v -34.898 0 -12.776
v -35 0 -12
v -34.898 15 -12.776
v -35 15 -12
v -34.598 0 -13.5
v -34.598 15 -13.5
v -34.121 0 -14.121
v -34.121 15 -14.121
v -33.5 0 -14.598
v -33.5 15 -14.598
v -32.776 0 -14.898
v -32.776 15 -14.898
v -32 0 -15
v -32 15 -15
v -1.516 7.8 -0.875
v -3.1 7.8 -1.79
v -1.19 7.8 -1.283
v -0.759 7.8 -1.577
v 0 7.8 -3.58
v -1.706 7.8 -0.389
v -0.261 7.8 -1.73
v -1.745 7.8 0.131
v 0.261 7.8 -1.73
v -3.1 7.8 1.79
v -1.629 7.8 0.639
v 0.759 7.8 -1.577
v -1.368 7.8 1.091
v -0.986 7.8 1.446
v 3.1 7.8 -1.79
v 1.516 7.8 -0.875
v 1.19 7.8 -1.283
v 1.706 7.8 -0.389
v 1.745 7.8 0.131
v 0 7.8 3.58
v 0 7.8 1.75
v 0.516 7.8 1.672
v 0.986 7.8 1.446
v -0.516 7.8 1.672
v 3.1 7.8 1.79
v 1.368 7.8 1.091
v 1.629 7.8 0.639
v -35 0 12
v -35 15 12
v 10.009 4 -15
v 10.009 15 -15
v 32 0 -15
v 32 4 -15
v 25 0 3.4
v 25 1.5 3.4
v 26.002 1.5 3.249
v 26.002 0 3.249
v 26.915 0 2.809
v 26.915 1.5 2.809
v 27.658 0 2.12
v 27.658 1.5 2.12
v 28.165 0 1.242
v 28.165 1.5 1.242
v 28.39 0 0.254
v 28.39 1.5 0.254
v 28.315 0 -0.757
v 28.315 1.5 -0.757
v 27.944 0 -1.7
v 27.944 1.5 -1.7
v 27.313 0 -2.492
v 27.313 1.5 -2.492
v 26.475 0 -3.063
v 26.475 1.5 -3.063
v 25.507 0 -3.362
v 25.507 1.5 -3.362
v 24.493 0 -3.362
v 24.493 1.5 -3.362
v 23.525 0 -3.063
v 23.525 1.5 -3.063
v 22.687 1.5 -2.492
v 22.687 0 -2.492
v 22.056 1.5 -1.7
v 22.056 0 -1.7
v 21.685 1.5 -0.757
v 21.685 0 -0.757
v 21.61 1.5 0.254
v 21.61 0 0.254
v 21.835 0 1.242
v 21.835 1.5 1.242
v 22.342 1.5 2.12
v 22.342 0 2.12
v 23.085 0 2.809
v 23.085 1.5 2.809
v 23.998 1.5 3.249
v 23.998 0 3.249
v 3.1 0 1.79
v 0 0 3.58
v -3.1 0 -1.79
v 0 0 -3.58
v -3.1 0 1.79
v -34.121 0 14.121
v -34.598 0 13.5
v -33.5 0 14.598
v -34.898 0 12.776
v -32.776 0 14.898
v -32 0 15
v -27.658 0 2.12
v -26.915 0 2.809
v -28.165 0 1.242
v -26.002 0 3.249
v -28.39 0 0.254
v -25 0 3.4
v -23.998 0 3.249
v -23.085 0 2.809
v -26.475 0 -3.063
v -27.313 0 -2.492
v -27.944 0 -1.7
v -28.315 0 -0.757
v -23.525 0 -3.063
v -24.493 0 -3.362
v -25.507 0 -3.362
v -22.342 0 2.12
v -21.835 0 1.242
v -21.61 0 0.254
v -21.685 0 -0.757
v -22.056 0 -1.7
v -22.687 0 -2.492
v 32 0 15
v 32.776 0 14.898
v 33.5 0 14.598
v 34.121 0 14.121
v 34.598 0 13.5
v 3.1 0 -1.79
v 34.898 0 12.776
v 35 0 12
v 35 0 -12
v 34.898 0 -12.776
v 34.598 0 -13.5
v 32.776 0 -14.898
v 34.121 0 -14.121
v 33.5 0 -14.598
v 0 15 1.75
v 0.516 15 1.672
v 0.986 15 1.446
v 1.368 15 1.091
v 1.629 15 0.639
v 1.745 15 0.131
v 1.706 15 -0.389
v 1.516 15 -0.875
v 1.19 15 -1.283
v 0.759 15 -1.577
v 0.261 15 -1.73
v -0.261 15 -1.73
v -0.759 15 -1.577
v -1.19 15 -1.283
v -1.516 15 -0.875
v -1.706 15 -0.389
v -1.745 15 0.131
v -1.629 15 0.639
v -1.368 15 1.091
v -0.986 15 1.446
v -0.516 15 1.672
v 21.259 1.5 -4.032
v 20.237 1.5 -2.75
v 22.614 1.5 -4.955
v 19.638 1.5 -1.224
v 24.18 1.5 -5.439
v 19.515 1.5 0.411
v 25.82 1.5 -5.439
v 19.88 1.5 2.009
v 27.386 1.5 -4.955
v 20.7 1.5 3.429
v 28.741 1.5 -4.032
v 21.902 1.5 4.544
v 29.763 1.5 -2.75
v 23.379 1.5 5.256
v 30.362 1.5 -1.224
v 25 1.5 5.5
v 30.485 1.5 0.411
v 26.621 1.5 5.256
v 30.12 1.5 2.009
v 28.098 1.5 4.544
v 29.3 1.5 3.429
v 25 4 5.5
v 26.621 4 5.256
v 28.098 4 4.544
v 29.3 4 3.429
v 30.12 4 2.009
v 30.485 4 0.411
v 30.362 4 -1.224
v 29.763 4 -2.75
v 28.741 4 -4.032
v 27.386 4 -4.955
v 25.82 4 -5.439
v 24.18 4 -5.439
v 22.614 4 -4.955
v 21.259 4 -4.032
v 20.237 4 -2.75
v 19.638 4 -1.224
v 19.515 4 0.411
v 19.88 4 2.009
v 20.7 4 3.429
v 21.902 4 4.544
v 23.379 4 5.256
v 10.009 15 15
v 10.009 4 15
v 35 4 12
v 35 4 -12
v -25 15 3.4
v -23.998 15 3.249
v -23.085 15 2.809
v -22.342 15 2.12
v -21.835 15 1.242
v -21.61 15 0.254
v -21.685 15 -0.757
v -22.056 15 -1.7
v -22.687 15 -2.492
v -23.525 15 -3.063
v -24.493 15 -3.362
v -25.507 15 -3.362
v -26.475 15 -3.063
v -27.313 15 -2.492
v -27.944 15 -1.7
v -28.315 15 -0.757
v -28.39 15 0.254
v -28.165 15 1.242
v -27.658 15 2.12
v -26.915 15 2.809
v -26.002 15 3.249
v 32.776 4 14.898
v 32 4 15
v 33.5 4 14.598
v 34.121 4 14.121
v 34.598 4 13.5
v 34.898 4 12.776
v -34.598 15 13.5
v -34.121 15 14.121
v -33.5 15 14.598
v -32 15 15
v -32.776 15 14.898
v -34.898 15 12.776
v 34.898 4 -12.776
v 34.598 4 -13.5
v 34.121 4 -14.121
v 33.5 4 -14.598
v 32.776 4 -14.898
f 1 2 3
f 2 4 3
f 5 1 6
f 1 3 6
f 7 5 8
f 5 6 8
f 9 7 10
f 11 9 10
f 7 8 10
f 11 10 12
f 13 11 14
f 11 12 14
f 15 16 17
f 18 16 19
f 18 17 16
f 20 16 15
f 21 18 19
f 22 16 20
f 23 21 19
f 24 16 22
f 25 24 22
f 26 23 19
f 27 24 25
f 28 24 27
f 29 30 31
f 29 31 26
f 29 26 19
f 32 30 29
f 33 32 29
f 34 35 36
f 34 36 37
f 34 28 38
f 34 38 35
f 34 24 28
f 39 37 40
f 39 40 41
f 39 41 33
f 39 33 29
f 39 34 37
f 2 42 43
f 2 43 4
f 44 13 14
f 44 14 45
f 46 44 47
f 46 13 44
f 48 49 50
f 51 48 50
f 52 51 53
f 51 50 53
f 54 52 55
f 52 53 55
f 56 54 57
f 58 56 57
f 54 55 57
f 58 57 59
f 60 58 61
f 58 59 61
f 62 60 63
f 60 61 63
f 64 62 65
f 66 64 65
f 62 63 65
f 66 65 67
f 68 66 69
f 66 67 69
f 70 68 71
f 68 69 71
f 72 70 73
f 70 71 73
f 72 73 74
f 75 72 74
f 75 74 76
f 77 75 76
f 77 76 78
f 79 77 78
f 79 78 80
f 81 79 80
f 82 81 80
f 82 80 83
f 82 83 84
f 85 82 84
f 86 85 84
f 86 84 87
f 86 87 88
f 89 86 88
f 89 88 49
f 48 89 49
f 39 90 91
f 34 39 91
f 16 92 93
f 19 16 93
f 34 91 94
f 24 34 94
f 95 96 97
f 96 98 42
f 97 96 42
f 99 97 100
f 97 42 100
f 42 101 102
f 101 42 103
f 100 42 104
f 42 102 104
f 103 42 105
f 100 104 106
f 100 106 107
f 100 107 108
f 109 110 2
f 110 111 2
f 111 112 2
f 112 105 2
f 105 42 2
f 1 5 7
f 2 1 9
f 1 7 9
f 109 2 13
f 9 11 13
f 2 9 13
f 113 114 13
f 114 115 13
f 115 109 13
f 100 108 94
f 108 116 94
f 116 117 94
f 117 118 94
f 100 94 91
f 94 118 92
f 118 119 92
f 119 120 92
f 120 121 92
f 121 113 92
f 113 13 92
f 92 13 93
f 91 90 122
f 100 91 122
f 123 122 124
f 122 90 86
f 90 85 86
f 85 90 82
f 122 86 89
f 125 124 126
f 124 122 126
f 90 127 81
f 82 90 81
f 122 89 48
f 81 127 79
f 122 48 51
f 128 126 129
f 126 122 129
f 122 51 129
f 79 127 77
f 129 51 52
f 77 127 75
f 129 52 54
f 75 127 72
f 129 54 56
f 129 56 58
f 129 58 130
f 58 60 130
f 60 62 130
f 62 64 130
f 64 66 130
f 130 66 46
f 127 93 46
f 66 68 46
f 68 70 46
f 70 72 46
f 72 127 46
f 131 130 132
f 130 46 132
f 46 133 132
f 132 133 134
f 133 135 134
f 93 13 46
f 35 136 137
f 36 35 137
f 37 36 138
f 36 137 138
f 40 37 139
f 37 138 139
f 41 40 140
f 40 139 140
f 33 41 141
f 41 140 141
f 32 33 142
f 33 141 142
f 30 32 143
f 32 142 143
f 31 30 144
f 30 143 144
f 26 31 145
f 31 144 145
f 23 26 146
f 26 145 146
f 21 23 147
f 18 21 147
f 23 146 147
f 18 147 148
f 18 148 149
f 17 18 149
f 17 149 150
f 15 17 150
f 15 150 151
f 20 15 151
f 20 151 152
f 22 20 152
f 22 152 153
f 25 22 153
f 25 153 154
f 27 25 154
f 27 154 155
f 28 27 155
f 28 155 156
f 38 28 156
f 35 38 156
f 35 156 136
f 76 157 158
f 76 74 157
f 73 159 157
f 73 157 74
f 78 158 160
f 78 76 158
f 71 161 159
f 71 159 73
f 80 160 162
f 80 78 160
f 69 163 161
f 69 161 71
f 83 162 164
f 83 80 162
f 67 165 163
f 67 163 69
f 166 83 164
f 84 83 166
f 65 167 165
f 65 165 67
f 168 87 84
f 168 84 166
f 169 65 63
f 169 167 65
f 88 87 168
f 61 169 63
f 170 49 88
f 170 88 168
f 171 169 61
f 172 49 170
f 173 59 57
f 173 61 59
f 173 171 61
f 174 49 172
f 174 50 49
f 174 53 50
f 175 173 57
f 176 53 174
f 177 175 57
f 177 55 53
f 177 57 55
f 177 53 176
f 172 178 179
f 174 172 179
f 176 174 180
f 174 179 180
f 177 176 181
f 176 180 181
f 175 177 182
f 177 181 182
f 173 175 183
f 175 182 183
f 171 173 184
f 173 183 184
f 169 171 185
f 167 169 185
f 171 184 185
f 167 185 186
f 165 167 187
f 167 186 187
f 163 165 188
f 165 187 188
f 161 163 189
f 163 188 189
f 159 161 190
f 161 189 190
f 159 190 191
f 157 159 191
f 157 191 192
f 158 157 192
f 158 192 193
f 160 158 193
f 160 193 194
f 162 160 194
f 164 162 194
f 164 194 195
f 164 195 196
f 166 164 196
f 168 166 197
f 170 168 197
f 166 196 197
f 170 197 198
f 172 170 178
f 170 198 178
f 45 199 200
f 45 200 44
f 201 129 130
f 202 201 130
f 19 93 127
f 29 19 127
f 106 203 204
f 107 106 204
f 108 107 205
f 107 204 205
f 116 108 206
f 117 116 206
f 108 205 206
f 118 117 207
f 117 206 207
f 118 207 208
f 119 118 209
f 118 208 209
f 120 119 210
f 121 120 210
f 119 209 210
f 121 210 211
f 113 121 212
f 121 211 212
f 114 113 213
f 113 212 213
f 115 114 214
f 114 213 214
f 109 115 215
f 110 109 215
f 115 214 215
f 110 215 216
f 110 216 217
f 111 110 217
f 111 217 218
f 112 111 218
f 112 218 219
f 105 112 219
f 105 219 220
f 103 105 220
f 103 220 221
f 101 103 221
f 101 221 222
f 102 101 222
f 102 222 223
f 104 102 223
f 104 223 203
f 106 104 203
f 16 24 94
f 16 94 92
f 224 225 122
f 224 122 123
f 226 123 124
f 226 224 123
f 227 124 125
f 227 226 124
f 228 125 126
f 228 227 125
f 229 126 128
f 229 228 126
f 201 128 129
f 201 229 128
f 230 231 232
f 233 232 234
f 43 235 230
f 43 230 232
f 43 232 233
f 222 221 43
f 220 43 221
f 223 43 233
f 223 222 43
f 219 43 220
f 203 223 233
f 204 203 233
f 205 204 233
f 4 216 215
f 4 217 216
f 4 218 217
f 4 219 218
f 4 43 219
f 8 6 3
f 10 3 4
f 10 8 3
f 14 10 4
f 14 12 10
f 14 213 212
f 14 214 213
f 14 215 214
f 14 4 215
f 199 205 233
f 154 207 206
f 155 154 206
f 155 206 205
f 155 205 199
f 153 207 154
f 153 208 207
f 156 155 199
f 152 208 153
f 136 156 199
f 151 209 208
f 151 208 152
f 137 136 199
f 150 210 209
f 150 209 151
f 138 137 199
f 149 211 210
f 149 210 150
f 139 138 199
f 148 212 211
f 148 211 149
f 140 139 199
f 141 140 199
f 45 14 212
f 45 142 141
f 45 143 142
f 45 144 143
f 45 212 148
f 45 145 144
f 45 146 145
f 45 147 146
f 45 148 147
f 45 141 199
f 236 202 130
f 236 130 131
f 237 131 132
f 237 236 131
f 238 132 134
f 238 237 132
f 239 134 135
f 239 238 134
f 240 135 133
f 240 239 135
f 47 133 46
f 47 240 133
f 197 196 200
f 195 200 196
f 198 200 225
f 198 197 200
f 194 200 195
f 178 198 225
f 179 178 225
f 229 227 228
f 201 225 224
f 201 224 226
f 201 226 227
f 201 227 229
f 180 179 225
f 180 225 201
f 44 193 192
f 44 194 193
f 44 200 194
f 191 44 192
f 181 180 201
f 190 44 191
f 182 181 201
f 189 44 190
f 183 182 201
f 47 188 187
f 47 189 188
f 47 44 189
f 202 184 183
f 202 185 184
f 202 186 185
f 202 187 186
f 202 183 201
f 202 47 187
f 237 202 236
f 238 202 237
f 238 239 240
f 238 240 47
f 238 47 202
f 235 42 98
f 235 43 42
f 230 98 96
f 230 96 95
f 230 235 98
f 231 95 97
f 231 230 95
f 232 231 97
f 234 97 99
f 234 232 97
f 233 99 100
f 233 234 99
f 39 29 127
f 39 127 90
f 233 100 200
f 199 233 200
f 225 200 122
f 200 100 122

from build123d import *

# Parameters (mm, degrees)
SKETCH_1_W          = 70
SKETCH_1_H          = 30
EXTRUDE_1_DEPTH     = 15
FILLET_1_R          = 3
SKETCH_5_R          = 1.75
SKETCH_5_R_2        = 3.4
CUT_EXTRUDE_1_DEPTH = 41.926763859
CUT_EXTRUDE_2_DEPTH = 7.8
SKETCH_7_W          = 30.080931192
SKETCH_7_H          = 35.934517801
CUT_EXTRUDE_4_DEPTH = 11
SKETCH_9_R          = 5.5
CUT_EXTRUDE_5_DEPTH = 2.5


with BuildPart() as part:
    # 草图1 → 凸台-拉伸1 (new body)
    with BuildSketch(Plane(origin=(0, 0, 0), x_dir=(1, 0, 0), z_dir=(0, 1, 0))):
        Rectangle(SKETCH_1_W, SKETCH_1_H)
    extrude(amount=EXTRUDE_1_DEPTH)

    # 圆角1
    fillet_1_edges = [part.edges().sort_by_distance(p)[0] for p in [
        (35, 7.5, 15),
        (-35, 7.5, 15),
        (-35, 7.5, -15),
        (35, 7.5, -15),
    ]]
    fillet(fillet_1_edges, radius=FILLET_1_R)

    # 草图5 → 切除-拉伸1 (cut, through all)
    with BuildSketch(Plane(origin=(0, 15, 0), x_dir=(1, 0, 0), z_dir=(0, 1, 0))):
        with Locations(Location((0, 0, 0), (0, 0, 270))):
            Circle(SKETCH_5_R)
        with Locations(Location((-25, 0, 0), (0, 0, 270))):
            Circle(SKETCH_5_R_2)
        with Locations(Location((25, 0, 0), (0, 0, 270))):
            Circle(SKETCH_5_R_2)
    extrude(amount=-CUT_EXTRUDE_1_DEPTH, mode=Mode.SUBTRACT)

    # 草图6 → 切除-拉伸2 (cut)
    with BuildSketch(Plane.XZ):
        Polygon((0, 3.579571669), (-3.1, 1.789785834), (-3.1, -1.789785834), (0, -3.579571669), (3.1, -1.789785834), (3.1, 1.789785834), align=None)
    extrude(amount=-CUT_EXTRUDE_2_DEPTH, mode=Mode.SUBTRACT)

    # 草图7 → 切除-拉伸4 (cut)
    with BuildSketch(Plane(origin=(0, 15, 0), x_dir=(1, 0, 0), z_dir=(0, 1, 0))):
        with Locations((25.049156013, -1.117442304)):
            Rectangle(SKETCH_7_W, SKETCH_7_H)
    extrude(amount=-CUT_EXTRUDE_4_DEPTH, mode=Mode.SUBTRACT)

    # 草图9 → 切除-拉伸5 (cut)
    with BuildSketch(Plane(origin=(0, 4, 0), x_dir=(1, 0, 0), z_dir=(0, 1, 0))):
        with Locations(Location((25, 0, 0), (0, 0, 270))):
            Circle(SKETCH_9_R)
    extrude(amount=-CUT_EXTRUDE_5_DEPTH, mode=Mode.SUBTRACT)


solid = part.part
